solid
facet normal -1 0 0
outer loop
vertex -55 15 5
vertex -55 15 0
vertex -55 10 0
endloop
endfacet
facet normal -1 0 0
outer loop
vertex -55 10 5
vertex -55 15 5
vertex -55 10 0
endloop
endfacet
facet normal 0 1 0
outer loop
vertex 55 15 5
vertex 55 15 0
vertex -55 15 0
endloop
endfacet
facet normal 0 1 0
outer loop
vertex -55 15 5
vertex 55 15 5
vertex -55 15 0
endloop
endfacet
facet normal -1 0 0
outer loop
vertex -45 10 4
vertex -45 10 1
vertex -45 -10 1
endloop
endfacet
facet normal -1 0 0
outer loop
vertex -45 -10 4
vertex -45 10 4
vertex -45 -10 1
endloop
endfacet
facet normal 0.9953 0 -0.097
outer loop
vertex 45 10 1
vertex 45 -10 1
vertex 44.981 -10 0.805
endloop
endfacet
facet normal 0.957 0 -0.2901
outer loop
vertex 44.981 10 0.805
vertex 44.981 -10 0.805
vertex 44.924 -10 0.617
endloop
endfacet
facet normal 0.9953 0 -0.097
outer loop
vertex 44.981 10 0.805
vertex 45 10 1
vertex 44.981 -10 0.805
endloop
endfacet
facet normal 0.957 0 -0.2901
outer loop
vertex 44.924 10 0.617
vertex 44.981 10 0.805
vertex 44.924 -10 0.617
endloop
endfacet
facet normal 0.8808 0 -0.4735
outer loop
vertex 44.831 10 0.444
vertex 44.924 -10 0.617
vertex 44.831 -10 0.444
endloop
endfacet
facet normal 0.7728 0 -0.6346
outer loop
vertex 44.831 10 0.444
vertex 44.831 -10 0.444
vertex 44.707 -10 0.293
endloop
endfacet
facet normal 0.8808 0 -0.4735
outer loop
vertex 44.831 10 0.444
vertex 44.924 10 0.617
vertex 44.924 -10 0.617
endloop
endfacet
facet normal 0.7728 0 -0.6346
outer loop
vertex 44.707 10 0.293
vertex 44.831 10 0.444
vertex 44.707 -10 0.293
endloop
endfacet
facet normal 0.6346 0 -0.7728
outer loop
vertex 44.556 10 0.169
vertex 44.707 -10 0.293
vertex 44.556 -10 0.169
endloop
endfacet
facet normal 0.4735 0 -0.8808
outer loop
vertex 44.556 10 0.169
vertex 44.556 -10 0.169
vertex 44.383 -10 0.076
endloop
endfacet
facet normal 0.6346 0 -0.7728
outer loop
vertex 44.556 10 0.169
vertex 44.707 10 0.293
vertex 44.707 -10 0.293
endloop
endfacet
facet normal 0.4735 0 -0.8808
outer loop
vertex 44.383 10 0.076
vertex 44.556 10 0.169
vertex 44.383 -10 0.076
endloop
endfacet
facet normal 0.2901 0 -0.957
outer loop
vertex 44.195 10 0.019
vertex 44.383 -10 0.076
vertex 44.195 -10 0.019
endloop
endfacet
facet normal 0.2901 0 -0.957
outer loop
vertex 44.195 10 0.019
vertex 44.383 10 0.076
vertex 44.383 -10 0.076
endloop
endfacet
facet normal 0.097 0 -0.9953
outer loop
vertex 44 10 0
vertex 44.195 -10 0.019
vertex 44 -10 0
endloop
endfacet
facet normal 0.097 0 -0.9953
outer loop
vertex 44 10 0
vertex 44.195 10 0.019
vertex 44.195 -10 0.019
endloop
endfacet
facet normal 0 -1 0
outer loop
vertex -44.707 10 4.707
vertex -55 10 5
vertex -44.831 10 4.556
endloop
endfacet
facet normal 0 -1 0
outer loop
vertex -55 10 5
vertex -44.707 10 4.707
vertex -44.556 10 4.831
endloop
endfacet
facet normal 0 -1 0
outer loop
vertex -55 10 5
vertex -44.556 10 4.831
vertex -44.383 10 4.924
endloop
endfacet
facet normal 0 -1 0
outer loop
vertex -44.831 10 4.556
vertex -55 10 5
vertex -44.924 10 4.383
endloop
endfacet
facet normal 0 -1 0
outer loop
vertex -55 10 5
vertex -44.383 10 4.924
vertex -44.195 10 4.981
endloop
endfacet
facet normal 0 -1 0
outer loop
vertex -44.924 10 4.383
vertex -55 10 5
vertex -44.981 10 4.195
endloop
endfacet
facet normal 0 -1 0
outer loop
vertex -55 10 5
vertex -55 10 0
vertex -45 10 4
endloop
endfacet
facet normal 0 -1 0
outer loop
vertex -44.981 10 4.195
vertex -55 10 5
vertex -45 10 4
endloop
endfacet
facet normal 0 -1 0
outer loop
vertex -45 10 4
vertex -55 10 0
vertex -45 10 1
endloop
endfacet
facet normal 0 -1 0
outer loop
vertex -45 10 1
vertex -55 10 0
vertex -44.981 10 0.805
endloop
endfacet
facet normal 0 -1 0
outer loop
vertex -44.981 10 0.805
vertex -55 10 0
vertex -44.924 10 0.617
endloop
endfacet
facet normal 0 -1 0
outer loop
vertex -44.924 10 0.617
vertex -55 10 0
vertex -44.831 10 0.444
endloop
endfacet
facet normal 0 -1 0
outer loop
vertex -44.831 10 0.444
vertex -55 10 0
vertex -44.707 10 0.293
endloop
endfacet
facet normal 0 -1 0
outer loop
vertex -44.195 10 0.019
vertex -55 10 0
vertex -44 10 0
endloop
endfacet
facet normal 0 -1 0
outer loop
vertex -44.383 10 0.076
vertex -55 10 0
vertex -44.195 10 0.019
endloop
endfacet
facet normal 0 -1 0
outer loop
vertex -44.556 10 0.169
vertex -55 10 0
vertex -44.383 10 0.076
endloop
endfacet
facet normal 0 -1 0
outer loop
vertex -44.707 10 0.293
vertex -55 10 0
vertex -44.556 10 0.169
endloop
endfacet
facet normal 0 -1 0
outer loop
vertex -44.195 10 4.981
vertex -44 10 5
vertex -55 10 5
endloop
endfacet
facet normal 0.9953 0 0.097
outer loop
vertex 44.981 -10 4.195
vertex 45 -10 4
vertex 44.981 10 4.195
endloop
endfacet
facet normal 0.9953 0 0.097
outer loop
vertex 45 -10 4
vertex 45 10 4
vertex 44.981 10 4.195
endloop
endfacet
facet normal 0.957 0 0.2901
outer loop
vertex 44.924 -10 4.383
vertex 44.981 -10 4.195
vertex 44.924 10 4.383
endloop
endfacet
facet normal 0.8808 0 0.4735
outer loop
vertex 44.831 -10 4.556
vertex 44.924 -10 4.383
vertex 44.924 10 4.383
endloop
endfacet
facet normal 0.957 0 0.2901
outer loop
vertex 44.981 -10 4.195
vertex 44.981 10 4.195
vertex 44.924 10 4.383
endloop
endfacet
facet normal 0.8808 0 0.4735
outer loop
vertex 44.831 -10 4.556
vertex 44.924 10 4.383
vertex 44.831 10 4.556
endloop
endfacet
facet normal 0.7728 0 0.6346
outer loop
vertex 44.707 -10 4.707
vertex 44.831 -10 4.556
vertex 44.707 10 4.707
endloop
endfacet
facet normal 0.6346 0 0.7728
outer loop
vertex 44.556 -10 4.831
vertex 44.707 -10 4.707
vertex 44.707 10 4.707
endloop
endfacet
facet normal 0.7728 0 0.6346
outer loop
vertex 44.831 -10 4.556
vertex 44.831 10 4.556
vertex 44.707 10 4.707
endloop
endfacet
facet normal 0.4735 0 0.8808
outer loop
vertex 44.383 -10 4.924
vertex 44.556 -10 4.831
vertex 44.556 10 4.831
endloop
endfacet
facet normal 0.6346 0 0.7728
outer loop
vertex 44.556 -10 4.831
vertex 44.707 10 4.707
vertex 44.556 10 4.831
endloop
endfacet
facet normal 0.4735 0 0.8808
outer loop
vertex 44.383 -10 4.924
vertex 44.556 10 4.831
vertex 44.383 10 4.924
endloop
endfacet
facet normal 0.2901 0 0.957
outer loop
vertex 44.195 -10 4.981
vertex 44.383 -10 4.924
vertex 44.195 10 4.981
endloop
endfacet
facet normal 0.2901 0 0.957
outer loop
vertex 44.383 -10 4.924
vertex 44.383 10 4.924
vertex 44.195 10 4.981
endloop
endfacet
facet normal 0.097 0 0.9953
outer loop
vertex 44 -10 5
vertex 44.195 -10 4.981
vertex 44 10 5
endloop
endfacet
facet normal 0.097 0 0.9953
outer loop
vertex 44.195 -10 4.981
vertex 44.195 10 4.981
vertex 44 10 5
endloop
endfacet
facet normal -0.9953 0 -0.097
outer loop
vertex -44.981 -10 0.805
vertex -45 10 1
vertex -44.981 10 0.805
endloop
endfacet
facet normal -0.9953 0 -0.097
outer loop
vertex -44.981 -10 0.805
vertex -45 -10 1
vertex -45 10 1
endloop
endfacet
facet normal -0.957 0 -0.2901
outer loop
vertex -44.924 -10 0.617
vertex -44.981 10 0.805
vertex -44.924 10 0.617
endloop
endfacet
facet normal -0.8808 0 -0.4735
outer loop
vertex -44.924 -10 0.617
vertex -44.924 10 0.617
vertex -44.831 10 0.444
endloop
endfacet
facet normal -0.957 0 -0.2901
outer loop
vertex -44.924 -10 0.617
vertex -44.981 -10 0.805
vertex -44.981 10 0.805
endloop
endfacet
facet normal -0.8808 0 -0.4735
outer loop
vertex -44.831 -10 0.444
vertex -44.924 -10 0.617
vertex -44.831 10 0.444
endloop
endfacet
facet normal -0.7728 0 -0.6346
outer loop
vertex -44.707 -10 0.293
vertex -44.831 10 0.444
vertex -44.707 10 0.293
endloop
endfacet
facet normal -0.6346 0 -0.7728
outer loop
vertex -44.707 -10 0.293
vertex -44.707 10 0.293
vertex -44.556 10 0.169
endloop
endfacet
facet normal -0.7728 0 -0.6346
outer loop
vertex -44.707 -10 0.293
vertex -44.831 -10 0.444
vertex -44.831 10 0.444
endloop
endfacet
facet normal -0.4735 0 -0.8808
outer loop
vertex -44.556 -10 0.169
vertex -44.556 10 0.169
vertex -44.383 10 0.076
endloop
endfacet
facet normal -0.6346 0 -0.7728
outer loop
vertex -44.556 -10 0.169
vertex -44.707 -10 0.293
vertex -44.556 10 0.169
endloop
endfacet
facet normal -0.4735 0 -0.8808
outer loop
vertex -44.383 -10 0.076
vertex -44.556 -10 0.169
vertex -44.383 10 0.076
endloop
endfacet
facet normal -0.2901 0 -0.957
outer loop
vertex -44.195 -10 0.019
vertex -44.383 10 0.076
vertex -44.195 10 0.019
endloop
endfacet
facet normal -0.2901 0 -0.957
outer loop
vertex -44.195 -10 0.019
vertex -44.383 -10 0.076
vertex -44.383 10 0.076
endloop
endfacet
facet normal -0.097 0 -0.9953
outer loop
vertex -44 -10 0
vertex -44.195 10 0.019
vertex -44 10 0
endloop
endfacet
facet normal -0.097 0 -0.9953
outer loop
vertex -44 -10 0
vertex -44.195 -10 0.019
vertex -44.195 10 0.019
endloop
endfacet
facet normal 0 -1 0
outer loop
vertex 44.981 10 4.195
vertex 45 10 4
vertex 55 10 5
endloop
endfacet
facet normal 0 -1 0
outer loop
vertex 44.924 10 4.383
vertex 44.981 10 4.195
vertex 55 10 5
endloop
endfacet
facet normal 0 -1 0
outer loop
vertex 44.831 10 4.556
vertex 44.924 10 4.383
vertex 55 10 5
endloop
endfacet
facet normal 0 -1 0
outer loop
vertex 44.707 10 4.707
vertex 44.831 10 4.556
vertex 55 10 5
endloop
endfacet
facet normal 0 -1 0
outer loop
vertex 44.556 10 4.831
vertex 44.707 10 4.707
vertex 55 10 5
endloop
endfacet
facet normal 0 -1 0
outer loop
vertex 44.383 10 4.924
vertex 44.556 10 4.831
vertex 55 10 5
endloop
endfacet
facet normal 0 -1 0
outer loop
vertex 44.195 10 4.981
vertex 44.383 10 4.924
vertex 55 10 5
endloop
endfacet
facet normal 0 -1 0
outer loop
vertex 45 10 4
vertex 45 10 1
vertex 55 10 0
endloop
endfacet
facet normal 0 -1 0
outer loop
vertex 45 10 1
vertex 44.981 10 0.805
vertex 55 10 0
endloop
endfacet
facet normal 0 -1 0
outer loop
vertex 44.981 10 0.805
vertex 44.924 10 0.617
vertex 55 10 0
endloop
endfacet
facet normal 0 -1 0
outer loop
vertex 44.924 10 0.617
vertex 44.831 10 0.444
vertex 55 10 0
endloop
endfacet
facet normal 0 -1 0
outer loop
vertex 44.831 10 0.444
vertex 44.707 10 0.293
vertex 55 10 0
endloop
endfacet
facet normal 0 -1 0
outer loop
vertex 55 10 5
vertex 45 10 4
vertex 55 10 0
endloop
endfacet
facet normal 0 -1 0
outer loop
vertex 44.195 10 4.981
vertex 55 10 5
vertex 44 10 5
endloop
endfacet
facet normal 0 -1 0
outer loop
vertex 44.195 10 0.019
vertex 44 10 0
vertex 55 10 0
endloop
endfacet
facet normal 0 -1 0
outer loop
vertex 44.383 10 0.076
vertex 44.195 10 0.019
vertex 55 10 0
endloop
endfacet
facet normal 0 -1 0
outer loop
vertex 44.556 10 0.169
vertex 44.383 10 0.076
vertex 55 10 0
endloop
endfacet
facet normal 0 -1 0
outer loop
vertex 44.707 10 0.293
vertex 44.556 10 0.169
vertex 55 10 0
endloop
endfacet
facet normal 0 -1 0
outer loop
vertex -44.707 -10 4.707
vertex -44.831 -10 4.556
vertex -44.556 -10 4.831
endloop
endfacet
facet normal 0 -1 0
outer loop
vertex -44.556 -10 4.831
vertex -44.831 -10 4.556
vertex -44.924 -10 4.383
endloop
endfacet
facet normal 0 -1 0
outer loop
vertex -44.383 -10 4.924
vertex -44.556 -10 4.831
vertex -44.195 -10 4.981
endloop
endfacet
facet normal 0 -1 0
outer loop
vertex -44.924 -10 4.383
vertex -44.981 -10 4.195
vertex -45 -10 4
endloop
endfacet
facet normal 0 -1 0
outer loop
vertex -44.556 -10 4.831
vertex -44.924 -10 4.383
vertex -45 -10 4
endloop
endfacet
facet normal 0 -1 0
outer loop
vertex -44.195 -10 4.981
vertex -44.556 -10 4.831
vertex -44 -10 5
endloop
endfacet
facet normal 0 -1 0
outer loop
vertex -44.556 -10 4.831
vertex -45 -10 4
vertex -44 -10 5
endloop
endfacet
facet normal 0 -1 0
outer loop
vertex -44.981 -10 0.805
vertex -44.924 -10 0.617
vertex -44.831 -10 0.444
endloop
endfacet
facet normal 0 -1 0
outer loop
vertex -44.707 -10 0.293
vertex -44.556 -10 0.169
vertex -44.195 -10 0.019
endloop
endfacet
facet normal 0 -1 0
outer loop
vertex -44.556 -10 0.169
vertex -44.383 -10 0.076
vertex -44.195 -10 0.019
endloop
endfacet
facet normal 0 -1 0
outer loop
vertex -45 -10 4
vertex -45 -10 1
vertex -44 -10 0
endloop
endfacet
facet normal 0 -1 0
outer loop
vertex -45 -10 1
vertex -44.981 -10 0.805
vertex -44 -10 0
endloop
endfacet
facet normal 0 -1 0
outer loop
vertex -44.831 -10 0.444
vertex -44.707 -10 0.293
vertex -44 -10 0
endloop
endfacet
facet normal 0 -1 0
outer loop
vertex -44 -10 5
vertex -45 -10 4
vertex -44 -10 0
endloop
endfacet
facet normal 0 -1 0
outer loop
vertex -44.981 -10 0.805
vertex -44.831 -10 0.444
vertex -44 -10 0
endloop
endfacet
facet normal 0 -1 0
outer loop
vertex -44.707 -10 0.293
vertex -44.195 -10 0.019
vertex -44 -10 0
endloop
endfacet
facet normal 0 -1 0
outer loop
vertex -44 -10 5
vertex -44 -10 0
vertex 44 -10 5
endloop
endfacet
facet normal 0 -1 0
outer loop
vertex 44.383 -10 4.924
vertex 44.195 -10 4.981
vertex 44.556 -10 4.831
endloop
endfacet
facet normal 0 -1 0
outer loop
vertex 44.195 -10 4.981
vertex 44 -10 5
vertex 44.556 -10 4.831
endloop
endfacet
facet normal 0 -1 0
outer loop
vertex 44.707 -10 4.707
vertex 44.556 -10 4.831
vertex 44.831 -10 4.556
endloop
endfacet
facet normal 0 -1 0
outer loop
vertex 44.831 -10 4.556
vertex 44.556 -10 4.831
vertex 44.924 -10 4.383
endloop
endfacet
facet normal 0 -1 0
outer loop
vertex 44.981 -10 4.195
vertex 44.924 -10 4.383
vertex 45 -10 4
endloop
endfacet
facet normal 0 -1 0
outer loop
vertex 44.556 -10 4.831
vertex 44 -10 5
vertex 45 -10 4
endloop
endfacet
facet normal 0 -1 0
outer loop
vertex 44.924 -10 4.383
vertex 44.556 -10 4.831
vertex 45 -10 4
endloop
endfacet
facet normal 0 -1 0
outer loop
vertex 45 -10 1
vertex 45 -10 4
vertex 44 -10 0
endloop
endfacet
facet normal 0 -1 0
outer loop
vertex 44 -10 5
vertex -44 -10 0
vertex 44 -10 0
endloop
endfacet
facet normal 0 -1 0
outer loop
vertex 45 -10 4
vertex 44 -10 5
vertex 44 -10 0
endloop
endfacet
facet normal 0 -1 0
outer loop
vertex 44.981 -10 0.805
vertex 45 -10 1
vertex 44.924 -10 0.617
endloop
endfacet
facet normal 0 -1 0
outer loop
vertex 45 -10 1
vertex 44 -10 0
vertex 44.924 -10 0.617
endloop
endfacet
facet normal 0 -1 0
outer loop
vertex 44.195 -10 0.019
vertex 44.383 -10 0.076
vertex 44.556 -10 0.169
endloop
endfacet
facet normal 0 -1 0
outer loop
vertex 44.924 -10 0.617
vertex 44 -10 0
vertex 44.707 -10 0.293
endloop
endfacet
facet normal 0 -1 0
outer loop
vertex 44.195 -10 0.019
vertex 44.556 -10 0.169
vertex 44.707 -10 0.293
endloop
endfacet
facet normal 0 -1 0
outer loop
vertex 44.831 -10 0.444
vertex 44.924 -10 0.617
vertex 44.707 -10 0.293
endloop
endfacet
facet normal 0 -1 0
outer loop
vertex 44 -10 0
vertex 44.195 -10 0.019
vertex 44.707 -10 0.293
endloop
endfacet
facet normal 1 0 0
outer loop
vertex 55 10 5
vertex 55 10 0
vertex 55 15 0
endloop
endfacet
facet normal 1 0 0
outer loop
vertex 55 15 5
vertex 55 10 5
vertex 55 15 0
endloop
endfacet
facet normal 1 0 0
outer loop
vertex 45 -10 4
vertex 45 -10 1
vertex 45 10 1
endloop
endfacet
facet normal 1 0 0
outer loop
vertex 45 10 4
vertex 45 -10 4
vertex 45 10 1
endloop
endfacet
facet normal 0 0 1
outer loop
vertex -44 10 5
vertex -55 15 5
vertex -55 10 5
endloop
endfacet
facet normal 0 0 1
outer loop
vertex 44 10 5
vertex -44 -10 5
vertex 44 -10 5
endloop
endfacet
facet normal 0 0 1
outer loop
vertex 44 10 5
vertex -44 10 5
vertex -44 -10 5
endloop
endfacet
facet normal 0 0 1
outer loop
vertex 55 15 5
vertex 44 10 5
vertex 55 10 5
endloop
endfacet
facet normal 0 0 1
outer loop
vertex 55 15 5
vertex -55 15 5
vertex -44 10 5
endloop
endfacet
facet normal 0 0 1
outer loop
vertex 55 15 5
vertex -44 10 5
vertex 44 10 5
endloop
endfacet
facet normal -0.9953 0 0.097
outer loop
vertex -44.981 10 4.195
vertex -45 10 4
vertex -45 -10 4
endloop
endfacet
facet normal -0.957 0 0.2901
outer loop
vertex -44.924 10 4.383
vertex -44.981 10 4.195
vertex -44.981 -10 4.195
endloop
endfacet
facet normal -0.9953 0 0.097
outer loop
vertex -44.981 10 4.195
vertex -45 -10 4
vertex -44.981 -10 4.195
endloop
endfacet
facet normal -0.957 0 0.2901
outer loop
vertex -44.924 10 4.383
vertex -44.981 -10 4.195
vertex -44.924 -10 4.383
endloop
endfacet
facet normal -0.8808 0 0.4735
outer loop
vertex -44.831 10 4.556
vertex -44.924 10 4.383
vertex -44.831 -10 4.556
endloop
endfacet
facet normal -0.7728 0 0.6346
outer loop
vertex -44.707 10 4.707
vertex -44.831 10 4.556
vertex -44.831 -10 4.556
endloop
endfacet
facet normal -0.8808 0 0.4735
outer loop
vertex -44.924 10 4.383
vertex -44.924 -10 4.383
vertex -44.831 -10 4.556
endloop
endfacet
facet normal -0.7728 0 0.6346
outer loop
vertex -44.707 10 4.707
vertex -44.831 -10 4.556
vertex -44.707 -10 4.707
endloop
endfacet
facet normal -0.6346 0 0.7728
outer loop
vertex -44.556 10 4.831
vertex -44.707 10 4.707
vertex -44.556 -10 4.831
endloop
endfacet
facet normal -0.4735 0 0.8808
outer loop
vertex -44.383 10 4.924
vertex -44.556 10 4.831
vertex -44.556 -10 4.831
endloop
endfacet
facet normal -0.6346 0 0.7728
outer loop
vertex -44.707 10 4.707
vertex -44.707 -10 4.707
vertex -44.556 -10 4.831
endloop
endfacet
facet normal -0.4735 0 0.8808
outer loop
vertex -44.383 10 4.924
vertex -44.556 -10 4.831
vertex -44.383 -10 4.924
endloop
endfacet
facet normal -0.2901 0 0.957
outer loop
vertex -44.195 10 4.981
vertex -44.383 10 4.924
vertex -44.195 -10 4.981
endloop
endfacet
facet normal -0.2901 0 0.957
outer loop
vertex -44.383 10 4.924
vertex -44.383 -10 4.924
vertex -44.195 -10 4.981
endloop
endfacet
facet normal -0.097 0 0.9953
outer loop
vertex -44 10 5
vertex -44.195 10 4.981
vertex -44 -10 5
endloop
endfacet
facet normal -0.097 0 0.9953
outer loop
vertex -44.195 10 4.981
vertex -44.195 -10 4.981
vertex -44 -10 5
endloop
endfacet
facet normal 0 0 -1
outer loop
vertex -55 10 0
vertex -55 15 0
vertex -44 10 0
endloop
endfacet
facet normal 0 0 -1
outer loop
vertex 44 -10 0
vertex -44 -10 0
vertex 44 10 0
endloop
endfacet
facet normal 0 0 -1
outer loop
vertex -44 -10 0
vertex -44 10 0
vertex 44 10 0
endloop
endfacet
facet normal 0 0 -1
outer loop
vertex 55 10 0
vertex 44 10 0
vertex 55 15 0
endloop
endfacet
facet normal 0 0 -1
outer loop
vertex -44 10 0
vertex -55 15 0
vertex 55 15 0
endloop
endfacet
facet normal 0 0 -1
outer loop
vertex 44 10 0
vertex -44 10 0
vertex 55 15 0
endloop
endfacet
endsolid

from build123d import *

# Parameters (mm, degrees)
PAD_DEPTH = 5
FILLET_R  = 1


with BuildPart() as part:
    # Sketch → Pad (new body)
    with BuildSketch(Plane.XY):
        Polygon((-45, -10), (45, -10), (45, 10), (55, 10), (55, 15), (-55, 15), (-55, 10), (-45, 10), align=None)
    extrude(amount=PAD_DEPTH)

    # Fillet
    fillet_edges = [part.edges().sort_by_distance(p)[0] for p in [
        (-45, 0, 5),
        (-45, 0, 0),
        (45, 0, 5),
        (45, 0, 0),
    ]]
    fillet(fillet_edges, radius=FILLET_R)


solid = part.part
